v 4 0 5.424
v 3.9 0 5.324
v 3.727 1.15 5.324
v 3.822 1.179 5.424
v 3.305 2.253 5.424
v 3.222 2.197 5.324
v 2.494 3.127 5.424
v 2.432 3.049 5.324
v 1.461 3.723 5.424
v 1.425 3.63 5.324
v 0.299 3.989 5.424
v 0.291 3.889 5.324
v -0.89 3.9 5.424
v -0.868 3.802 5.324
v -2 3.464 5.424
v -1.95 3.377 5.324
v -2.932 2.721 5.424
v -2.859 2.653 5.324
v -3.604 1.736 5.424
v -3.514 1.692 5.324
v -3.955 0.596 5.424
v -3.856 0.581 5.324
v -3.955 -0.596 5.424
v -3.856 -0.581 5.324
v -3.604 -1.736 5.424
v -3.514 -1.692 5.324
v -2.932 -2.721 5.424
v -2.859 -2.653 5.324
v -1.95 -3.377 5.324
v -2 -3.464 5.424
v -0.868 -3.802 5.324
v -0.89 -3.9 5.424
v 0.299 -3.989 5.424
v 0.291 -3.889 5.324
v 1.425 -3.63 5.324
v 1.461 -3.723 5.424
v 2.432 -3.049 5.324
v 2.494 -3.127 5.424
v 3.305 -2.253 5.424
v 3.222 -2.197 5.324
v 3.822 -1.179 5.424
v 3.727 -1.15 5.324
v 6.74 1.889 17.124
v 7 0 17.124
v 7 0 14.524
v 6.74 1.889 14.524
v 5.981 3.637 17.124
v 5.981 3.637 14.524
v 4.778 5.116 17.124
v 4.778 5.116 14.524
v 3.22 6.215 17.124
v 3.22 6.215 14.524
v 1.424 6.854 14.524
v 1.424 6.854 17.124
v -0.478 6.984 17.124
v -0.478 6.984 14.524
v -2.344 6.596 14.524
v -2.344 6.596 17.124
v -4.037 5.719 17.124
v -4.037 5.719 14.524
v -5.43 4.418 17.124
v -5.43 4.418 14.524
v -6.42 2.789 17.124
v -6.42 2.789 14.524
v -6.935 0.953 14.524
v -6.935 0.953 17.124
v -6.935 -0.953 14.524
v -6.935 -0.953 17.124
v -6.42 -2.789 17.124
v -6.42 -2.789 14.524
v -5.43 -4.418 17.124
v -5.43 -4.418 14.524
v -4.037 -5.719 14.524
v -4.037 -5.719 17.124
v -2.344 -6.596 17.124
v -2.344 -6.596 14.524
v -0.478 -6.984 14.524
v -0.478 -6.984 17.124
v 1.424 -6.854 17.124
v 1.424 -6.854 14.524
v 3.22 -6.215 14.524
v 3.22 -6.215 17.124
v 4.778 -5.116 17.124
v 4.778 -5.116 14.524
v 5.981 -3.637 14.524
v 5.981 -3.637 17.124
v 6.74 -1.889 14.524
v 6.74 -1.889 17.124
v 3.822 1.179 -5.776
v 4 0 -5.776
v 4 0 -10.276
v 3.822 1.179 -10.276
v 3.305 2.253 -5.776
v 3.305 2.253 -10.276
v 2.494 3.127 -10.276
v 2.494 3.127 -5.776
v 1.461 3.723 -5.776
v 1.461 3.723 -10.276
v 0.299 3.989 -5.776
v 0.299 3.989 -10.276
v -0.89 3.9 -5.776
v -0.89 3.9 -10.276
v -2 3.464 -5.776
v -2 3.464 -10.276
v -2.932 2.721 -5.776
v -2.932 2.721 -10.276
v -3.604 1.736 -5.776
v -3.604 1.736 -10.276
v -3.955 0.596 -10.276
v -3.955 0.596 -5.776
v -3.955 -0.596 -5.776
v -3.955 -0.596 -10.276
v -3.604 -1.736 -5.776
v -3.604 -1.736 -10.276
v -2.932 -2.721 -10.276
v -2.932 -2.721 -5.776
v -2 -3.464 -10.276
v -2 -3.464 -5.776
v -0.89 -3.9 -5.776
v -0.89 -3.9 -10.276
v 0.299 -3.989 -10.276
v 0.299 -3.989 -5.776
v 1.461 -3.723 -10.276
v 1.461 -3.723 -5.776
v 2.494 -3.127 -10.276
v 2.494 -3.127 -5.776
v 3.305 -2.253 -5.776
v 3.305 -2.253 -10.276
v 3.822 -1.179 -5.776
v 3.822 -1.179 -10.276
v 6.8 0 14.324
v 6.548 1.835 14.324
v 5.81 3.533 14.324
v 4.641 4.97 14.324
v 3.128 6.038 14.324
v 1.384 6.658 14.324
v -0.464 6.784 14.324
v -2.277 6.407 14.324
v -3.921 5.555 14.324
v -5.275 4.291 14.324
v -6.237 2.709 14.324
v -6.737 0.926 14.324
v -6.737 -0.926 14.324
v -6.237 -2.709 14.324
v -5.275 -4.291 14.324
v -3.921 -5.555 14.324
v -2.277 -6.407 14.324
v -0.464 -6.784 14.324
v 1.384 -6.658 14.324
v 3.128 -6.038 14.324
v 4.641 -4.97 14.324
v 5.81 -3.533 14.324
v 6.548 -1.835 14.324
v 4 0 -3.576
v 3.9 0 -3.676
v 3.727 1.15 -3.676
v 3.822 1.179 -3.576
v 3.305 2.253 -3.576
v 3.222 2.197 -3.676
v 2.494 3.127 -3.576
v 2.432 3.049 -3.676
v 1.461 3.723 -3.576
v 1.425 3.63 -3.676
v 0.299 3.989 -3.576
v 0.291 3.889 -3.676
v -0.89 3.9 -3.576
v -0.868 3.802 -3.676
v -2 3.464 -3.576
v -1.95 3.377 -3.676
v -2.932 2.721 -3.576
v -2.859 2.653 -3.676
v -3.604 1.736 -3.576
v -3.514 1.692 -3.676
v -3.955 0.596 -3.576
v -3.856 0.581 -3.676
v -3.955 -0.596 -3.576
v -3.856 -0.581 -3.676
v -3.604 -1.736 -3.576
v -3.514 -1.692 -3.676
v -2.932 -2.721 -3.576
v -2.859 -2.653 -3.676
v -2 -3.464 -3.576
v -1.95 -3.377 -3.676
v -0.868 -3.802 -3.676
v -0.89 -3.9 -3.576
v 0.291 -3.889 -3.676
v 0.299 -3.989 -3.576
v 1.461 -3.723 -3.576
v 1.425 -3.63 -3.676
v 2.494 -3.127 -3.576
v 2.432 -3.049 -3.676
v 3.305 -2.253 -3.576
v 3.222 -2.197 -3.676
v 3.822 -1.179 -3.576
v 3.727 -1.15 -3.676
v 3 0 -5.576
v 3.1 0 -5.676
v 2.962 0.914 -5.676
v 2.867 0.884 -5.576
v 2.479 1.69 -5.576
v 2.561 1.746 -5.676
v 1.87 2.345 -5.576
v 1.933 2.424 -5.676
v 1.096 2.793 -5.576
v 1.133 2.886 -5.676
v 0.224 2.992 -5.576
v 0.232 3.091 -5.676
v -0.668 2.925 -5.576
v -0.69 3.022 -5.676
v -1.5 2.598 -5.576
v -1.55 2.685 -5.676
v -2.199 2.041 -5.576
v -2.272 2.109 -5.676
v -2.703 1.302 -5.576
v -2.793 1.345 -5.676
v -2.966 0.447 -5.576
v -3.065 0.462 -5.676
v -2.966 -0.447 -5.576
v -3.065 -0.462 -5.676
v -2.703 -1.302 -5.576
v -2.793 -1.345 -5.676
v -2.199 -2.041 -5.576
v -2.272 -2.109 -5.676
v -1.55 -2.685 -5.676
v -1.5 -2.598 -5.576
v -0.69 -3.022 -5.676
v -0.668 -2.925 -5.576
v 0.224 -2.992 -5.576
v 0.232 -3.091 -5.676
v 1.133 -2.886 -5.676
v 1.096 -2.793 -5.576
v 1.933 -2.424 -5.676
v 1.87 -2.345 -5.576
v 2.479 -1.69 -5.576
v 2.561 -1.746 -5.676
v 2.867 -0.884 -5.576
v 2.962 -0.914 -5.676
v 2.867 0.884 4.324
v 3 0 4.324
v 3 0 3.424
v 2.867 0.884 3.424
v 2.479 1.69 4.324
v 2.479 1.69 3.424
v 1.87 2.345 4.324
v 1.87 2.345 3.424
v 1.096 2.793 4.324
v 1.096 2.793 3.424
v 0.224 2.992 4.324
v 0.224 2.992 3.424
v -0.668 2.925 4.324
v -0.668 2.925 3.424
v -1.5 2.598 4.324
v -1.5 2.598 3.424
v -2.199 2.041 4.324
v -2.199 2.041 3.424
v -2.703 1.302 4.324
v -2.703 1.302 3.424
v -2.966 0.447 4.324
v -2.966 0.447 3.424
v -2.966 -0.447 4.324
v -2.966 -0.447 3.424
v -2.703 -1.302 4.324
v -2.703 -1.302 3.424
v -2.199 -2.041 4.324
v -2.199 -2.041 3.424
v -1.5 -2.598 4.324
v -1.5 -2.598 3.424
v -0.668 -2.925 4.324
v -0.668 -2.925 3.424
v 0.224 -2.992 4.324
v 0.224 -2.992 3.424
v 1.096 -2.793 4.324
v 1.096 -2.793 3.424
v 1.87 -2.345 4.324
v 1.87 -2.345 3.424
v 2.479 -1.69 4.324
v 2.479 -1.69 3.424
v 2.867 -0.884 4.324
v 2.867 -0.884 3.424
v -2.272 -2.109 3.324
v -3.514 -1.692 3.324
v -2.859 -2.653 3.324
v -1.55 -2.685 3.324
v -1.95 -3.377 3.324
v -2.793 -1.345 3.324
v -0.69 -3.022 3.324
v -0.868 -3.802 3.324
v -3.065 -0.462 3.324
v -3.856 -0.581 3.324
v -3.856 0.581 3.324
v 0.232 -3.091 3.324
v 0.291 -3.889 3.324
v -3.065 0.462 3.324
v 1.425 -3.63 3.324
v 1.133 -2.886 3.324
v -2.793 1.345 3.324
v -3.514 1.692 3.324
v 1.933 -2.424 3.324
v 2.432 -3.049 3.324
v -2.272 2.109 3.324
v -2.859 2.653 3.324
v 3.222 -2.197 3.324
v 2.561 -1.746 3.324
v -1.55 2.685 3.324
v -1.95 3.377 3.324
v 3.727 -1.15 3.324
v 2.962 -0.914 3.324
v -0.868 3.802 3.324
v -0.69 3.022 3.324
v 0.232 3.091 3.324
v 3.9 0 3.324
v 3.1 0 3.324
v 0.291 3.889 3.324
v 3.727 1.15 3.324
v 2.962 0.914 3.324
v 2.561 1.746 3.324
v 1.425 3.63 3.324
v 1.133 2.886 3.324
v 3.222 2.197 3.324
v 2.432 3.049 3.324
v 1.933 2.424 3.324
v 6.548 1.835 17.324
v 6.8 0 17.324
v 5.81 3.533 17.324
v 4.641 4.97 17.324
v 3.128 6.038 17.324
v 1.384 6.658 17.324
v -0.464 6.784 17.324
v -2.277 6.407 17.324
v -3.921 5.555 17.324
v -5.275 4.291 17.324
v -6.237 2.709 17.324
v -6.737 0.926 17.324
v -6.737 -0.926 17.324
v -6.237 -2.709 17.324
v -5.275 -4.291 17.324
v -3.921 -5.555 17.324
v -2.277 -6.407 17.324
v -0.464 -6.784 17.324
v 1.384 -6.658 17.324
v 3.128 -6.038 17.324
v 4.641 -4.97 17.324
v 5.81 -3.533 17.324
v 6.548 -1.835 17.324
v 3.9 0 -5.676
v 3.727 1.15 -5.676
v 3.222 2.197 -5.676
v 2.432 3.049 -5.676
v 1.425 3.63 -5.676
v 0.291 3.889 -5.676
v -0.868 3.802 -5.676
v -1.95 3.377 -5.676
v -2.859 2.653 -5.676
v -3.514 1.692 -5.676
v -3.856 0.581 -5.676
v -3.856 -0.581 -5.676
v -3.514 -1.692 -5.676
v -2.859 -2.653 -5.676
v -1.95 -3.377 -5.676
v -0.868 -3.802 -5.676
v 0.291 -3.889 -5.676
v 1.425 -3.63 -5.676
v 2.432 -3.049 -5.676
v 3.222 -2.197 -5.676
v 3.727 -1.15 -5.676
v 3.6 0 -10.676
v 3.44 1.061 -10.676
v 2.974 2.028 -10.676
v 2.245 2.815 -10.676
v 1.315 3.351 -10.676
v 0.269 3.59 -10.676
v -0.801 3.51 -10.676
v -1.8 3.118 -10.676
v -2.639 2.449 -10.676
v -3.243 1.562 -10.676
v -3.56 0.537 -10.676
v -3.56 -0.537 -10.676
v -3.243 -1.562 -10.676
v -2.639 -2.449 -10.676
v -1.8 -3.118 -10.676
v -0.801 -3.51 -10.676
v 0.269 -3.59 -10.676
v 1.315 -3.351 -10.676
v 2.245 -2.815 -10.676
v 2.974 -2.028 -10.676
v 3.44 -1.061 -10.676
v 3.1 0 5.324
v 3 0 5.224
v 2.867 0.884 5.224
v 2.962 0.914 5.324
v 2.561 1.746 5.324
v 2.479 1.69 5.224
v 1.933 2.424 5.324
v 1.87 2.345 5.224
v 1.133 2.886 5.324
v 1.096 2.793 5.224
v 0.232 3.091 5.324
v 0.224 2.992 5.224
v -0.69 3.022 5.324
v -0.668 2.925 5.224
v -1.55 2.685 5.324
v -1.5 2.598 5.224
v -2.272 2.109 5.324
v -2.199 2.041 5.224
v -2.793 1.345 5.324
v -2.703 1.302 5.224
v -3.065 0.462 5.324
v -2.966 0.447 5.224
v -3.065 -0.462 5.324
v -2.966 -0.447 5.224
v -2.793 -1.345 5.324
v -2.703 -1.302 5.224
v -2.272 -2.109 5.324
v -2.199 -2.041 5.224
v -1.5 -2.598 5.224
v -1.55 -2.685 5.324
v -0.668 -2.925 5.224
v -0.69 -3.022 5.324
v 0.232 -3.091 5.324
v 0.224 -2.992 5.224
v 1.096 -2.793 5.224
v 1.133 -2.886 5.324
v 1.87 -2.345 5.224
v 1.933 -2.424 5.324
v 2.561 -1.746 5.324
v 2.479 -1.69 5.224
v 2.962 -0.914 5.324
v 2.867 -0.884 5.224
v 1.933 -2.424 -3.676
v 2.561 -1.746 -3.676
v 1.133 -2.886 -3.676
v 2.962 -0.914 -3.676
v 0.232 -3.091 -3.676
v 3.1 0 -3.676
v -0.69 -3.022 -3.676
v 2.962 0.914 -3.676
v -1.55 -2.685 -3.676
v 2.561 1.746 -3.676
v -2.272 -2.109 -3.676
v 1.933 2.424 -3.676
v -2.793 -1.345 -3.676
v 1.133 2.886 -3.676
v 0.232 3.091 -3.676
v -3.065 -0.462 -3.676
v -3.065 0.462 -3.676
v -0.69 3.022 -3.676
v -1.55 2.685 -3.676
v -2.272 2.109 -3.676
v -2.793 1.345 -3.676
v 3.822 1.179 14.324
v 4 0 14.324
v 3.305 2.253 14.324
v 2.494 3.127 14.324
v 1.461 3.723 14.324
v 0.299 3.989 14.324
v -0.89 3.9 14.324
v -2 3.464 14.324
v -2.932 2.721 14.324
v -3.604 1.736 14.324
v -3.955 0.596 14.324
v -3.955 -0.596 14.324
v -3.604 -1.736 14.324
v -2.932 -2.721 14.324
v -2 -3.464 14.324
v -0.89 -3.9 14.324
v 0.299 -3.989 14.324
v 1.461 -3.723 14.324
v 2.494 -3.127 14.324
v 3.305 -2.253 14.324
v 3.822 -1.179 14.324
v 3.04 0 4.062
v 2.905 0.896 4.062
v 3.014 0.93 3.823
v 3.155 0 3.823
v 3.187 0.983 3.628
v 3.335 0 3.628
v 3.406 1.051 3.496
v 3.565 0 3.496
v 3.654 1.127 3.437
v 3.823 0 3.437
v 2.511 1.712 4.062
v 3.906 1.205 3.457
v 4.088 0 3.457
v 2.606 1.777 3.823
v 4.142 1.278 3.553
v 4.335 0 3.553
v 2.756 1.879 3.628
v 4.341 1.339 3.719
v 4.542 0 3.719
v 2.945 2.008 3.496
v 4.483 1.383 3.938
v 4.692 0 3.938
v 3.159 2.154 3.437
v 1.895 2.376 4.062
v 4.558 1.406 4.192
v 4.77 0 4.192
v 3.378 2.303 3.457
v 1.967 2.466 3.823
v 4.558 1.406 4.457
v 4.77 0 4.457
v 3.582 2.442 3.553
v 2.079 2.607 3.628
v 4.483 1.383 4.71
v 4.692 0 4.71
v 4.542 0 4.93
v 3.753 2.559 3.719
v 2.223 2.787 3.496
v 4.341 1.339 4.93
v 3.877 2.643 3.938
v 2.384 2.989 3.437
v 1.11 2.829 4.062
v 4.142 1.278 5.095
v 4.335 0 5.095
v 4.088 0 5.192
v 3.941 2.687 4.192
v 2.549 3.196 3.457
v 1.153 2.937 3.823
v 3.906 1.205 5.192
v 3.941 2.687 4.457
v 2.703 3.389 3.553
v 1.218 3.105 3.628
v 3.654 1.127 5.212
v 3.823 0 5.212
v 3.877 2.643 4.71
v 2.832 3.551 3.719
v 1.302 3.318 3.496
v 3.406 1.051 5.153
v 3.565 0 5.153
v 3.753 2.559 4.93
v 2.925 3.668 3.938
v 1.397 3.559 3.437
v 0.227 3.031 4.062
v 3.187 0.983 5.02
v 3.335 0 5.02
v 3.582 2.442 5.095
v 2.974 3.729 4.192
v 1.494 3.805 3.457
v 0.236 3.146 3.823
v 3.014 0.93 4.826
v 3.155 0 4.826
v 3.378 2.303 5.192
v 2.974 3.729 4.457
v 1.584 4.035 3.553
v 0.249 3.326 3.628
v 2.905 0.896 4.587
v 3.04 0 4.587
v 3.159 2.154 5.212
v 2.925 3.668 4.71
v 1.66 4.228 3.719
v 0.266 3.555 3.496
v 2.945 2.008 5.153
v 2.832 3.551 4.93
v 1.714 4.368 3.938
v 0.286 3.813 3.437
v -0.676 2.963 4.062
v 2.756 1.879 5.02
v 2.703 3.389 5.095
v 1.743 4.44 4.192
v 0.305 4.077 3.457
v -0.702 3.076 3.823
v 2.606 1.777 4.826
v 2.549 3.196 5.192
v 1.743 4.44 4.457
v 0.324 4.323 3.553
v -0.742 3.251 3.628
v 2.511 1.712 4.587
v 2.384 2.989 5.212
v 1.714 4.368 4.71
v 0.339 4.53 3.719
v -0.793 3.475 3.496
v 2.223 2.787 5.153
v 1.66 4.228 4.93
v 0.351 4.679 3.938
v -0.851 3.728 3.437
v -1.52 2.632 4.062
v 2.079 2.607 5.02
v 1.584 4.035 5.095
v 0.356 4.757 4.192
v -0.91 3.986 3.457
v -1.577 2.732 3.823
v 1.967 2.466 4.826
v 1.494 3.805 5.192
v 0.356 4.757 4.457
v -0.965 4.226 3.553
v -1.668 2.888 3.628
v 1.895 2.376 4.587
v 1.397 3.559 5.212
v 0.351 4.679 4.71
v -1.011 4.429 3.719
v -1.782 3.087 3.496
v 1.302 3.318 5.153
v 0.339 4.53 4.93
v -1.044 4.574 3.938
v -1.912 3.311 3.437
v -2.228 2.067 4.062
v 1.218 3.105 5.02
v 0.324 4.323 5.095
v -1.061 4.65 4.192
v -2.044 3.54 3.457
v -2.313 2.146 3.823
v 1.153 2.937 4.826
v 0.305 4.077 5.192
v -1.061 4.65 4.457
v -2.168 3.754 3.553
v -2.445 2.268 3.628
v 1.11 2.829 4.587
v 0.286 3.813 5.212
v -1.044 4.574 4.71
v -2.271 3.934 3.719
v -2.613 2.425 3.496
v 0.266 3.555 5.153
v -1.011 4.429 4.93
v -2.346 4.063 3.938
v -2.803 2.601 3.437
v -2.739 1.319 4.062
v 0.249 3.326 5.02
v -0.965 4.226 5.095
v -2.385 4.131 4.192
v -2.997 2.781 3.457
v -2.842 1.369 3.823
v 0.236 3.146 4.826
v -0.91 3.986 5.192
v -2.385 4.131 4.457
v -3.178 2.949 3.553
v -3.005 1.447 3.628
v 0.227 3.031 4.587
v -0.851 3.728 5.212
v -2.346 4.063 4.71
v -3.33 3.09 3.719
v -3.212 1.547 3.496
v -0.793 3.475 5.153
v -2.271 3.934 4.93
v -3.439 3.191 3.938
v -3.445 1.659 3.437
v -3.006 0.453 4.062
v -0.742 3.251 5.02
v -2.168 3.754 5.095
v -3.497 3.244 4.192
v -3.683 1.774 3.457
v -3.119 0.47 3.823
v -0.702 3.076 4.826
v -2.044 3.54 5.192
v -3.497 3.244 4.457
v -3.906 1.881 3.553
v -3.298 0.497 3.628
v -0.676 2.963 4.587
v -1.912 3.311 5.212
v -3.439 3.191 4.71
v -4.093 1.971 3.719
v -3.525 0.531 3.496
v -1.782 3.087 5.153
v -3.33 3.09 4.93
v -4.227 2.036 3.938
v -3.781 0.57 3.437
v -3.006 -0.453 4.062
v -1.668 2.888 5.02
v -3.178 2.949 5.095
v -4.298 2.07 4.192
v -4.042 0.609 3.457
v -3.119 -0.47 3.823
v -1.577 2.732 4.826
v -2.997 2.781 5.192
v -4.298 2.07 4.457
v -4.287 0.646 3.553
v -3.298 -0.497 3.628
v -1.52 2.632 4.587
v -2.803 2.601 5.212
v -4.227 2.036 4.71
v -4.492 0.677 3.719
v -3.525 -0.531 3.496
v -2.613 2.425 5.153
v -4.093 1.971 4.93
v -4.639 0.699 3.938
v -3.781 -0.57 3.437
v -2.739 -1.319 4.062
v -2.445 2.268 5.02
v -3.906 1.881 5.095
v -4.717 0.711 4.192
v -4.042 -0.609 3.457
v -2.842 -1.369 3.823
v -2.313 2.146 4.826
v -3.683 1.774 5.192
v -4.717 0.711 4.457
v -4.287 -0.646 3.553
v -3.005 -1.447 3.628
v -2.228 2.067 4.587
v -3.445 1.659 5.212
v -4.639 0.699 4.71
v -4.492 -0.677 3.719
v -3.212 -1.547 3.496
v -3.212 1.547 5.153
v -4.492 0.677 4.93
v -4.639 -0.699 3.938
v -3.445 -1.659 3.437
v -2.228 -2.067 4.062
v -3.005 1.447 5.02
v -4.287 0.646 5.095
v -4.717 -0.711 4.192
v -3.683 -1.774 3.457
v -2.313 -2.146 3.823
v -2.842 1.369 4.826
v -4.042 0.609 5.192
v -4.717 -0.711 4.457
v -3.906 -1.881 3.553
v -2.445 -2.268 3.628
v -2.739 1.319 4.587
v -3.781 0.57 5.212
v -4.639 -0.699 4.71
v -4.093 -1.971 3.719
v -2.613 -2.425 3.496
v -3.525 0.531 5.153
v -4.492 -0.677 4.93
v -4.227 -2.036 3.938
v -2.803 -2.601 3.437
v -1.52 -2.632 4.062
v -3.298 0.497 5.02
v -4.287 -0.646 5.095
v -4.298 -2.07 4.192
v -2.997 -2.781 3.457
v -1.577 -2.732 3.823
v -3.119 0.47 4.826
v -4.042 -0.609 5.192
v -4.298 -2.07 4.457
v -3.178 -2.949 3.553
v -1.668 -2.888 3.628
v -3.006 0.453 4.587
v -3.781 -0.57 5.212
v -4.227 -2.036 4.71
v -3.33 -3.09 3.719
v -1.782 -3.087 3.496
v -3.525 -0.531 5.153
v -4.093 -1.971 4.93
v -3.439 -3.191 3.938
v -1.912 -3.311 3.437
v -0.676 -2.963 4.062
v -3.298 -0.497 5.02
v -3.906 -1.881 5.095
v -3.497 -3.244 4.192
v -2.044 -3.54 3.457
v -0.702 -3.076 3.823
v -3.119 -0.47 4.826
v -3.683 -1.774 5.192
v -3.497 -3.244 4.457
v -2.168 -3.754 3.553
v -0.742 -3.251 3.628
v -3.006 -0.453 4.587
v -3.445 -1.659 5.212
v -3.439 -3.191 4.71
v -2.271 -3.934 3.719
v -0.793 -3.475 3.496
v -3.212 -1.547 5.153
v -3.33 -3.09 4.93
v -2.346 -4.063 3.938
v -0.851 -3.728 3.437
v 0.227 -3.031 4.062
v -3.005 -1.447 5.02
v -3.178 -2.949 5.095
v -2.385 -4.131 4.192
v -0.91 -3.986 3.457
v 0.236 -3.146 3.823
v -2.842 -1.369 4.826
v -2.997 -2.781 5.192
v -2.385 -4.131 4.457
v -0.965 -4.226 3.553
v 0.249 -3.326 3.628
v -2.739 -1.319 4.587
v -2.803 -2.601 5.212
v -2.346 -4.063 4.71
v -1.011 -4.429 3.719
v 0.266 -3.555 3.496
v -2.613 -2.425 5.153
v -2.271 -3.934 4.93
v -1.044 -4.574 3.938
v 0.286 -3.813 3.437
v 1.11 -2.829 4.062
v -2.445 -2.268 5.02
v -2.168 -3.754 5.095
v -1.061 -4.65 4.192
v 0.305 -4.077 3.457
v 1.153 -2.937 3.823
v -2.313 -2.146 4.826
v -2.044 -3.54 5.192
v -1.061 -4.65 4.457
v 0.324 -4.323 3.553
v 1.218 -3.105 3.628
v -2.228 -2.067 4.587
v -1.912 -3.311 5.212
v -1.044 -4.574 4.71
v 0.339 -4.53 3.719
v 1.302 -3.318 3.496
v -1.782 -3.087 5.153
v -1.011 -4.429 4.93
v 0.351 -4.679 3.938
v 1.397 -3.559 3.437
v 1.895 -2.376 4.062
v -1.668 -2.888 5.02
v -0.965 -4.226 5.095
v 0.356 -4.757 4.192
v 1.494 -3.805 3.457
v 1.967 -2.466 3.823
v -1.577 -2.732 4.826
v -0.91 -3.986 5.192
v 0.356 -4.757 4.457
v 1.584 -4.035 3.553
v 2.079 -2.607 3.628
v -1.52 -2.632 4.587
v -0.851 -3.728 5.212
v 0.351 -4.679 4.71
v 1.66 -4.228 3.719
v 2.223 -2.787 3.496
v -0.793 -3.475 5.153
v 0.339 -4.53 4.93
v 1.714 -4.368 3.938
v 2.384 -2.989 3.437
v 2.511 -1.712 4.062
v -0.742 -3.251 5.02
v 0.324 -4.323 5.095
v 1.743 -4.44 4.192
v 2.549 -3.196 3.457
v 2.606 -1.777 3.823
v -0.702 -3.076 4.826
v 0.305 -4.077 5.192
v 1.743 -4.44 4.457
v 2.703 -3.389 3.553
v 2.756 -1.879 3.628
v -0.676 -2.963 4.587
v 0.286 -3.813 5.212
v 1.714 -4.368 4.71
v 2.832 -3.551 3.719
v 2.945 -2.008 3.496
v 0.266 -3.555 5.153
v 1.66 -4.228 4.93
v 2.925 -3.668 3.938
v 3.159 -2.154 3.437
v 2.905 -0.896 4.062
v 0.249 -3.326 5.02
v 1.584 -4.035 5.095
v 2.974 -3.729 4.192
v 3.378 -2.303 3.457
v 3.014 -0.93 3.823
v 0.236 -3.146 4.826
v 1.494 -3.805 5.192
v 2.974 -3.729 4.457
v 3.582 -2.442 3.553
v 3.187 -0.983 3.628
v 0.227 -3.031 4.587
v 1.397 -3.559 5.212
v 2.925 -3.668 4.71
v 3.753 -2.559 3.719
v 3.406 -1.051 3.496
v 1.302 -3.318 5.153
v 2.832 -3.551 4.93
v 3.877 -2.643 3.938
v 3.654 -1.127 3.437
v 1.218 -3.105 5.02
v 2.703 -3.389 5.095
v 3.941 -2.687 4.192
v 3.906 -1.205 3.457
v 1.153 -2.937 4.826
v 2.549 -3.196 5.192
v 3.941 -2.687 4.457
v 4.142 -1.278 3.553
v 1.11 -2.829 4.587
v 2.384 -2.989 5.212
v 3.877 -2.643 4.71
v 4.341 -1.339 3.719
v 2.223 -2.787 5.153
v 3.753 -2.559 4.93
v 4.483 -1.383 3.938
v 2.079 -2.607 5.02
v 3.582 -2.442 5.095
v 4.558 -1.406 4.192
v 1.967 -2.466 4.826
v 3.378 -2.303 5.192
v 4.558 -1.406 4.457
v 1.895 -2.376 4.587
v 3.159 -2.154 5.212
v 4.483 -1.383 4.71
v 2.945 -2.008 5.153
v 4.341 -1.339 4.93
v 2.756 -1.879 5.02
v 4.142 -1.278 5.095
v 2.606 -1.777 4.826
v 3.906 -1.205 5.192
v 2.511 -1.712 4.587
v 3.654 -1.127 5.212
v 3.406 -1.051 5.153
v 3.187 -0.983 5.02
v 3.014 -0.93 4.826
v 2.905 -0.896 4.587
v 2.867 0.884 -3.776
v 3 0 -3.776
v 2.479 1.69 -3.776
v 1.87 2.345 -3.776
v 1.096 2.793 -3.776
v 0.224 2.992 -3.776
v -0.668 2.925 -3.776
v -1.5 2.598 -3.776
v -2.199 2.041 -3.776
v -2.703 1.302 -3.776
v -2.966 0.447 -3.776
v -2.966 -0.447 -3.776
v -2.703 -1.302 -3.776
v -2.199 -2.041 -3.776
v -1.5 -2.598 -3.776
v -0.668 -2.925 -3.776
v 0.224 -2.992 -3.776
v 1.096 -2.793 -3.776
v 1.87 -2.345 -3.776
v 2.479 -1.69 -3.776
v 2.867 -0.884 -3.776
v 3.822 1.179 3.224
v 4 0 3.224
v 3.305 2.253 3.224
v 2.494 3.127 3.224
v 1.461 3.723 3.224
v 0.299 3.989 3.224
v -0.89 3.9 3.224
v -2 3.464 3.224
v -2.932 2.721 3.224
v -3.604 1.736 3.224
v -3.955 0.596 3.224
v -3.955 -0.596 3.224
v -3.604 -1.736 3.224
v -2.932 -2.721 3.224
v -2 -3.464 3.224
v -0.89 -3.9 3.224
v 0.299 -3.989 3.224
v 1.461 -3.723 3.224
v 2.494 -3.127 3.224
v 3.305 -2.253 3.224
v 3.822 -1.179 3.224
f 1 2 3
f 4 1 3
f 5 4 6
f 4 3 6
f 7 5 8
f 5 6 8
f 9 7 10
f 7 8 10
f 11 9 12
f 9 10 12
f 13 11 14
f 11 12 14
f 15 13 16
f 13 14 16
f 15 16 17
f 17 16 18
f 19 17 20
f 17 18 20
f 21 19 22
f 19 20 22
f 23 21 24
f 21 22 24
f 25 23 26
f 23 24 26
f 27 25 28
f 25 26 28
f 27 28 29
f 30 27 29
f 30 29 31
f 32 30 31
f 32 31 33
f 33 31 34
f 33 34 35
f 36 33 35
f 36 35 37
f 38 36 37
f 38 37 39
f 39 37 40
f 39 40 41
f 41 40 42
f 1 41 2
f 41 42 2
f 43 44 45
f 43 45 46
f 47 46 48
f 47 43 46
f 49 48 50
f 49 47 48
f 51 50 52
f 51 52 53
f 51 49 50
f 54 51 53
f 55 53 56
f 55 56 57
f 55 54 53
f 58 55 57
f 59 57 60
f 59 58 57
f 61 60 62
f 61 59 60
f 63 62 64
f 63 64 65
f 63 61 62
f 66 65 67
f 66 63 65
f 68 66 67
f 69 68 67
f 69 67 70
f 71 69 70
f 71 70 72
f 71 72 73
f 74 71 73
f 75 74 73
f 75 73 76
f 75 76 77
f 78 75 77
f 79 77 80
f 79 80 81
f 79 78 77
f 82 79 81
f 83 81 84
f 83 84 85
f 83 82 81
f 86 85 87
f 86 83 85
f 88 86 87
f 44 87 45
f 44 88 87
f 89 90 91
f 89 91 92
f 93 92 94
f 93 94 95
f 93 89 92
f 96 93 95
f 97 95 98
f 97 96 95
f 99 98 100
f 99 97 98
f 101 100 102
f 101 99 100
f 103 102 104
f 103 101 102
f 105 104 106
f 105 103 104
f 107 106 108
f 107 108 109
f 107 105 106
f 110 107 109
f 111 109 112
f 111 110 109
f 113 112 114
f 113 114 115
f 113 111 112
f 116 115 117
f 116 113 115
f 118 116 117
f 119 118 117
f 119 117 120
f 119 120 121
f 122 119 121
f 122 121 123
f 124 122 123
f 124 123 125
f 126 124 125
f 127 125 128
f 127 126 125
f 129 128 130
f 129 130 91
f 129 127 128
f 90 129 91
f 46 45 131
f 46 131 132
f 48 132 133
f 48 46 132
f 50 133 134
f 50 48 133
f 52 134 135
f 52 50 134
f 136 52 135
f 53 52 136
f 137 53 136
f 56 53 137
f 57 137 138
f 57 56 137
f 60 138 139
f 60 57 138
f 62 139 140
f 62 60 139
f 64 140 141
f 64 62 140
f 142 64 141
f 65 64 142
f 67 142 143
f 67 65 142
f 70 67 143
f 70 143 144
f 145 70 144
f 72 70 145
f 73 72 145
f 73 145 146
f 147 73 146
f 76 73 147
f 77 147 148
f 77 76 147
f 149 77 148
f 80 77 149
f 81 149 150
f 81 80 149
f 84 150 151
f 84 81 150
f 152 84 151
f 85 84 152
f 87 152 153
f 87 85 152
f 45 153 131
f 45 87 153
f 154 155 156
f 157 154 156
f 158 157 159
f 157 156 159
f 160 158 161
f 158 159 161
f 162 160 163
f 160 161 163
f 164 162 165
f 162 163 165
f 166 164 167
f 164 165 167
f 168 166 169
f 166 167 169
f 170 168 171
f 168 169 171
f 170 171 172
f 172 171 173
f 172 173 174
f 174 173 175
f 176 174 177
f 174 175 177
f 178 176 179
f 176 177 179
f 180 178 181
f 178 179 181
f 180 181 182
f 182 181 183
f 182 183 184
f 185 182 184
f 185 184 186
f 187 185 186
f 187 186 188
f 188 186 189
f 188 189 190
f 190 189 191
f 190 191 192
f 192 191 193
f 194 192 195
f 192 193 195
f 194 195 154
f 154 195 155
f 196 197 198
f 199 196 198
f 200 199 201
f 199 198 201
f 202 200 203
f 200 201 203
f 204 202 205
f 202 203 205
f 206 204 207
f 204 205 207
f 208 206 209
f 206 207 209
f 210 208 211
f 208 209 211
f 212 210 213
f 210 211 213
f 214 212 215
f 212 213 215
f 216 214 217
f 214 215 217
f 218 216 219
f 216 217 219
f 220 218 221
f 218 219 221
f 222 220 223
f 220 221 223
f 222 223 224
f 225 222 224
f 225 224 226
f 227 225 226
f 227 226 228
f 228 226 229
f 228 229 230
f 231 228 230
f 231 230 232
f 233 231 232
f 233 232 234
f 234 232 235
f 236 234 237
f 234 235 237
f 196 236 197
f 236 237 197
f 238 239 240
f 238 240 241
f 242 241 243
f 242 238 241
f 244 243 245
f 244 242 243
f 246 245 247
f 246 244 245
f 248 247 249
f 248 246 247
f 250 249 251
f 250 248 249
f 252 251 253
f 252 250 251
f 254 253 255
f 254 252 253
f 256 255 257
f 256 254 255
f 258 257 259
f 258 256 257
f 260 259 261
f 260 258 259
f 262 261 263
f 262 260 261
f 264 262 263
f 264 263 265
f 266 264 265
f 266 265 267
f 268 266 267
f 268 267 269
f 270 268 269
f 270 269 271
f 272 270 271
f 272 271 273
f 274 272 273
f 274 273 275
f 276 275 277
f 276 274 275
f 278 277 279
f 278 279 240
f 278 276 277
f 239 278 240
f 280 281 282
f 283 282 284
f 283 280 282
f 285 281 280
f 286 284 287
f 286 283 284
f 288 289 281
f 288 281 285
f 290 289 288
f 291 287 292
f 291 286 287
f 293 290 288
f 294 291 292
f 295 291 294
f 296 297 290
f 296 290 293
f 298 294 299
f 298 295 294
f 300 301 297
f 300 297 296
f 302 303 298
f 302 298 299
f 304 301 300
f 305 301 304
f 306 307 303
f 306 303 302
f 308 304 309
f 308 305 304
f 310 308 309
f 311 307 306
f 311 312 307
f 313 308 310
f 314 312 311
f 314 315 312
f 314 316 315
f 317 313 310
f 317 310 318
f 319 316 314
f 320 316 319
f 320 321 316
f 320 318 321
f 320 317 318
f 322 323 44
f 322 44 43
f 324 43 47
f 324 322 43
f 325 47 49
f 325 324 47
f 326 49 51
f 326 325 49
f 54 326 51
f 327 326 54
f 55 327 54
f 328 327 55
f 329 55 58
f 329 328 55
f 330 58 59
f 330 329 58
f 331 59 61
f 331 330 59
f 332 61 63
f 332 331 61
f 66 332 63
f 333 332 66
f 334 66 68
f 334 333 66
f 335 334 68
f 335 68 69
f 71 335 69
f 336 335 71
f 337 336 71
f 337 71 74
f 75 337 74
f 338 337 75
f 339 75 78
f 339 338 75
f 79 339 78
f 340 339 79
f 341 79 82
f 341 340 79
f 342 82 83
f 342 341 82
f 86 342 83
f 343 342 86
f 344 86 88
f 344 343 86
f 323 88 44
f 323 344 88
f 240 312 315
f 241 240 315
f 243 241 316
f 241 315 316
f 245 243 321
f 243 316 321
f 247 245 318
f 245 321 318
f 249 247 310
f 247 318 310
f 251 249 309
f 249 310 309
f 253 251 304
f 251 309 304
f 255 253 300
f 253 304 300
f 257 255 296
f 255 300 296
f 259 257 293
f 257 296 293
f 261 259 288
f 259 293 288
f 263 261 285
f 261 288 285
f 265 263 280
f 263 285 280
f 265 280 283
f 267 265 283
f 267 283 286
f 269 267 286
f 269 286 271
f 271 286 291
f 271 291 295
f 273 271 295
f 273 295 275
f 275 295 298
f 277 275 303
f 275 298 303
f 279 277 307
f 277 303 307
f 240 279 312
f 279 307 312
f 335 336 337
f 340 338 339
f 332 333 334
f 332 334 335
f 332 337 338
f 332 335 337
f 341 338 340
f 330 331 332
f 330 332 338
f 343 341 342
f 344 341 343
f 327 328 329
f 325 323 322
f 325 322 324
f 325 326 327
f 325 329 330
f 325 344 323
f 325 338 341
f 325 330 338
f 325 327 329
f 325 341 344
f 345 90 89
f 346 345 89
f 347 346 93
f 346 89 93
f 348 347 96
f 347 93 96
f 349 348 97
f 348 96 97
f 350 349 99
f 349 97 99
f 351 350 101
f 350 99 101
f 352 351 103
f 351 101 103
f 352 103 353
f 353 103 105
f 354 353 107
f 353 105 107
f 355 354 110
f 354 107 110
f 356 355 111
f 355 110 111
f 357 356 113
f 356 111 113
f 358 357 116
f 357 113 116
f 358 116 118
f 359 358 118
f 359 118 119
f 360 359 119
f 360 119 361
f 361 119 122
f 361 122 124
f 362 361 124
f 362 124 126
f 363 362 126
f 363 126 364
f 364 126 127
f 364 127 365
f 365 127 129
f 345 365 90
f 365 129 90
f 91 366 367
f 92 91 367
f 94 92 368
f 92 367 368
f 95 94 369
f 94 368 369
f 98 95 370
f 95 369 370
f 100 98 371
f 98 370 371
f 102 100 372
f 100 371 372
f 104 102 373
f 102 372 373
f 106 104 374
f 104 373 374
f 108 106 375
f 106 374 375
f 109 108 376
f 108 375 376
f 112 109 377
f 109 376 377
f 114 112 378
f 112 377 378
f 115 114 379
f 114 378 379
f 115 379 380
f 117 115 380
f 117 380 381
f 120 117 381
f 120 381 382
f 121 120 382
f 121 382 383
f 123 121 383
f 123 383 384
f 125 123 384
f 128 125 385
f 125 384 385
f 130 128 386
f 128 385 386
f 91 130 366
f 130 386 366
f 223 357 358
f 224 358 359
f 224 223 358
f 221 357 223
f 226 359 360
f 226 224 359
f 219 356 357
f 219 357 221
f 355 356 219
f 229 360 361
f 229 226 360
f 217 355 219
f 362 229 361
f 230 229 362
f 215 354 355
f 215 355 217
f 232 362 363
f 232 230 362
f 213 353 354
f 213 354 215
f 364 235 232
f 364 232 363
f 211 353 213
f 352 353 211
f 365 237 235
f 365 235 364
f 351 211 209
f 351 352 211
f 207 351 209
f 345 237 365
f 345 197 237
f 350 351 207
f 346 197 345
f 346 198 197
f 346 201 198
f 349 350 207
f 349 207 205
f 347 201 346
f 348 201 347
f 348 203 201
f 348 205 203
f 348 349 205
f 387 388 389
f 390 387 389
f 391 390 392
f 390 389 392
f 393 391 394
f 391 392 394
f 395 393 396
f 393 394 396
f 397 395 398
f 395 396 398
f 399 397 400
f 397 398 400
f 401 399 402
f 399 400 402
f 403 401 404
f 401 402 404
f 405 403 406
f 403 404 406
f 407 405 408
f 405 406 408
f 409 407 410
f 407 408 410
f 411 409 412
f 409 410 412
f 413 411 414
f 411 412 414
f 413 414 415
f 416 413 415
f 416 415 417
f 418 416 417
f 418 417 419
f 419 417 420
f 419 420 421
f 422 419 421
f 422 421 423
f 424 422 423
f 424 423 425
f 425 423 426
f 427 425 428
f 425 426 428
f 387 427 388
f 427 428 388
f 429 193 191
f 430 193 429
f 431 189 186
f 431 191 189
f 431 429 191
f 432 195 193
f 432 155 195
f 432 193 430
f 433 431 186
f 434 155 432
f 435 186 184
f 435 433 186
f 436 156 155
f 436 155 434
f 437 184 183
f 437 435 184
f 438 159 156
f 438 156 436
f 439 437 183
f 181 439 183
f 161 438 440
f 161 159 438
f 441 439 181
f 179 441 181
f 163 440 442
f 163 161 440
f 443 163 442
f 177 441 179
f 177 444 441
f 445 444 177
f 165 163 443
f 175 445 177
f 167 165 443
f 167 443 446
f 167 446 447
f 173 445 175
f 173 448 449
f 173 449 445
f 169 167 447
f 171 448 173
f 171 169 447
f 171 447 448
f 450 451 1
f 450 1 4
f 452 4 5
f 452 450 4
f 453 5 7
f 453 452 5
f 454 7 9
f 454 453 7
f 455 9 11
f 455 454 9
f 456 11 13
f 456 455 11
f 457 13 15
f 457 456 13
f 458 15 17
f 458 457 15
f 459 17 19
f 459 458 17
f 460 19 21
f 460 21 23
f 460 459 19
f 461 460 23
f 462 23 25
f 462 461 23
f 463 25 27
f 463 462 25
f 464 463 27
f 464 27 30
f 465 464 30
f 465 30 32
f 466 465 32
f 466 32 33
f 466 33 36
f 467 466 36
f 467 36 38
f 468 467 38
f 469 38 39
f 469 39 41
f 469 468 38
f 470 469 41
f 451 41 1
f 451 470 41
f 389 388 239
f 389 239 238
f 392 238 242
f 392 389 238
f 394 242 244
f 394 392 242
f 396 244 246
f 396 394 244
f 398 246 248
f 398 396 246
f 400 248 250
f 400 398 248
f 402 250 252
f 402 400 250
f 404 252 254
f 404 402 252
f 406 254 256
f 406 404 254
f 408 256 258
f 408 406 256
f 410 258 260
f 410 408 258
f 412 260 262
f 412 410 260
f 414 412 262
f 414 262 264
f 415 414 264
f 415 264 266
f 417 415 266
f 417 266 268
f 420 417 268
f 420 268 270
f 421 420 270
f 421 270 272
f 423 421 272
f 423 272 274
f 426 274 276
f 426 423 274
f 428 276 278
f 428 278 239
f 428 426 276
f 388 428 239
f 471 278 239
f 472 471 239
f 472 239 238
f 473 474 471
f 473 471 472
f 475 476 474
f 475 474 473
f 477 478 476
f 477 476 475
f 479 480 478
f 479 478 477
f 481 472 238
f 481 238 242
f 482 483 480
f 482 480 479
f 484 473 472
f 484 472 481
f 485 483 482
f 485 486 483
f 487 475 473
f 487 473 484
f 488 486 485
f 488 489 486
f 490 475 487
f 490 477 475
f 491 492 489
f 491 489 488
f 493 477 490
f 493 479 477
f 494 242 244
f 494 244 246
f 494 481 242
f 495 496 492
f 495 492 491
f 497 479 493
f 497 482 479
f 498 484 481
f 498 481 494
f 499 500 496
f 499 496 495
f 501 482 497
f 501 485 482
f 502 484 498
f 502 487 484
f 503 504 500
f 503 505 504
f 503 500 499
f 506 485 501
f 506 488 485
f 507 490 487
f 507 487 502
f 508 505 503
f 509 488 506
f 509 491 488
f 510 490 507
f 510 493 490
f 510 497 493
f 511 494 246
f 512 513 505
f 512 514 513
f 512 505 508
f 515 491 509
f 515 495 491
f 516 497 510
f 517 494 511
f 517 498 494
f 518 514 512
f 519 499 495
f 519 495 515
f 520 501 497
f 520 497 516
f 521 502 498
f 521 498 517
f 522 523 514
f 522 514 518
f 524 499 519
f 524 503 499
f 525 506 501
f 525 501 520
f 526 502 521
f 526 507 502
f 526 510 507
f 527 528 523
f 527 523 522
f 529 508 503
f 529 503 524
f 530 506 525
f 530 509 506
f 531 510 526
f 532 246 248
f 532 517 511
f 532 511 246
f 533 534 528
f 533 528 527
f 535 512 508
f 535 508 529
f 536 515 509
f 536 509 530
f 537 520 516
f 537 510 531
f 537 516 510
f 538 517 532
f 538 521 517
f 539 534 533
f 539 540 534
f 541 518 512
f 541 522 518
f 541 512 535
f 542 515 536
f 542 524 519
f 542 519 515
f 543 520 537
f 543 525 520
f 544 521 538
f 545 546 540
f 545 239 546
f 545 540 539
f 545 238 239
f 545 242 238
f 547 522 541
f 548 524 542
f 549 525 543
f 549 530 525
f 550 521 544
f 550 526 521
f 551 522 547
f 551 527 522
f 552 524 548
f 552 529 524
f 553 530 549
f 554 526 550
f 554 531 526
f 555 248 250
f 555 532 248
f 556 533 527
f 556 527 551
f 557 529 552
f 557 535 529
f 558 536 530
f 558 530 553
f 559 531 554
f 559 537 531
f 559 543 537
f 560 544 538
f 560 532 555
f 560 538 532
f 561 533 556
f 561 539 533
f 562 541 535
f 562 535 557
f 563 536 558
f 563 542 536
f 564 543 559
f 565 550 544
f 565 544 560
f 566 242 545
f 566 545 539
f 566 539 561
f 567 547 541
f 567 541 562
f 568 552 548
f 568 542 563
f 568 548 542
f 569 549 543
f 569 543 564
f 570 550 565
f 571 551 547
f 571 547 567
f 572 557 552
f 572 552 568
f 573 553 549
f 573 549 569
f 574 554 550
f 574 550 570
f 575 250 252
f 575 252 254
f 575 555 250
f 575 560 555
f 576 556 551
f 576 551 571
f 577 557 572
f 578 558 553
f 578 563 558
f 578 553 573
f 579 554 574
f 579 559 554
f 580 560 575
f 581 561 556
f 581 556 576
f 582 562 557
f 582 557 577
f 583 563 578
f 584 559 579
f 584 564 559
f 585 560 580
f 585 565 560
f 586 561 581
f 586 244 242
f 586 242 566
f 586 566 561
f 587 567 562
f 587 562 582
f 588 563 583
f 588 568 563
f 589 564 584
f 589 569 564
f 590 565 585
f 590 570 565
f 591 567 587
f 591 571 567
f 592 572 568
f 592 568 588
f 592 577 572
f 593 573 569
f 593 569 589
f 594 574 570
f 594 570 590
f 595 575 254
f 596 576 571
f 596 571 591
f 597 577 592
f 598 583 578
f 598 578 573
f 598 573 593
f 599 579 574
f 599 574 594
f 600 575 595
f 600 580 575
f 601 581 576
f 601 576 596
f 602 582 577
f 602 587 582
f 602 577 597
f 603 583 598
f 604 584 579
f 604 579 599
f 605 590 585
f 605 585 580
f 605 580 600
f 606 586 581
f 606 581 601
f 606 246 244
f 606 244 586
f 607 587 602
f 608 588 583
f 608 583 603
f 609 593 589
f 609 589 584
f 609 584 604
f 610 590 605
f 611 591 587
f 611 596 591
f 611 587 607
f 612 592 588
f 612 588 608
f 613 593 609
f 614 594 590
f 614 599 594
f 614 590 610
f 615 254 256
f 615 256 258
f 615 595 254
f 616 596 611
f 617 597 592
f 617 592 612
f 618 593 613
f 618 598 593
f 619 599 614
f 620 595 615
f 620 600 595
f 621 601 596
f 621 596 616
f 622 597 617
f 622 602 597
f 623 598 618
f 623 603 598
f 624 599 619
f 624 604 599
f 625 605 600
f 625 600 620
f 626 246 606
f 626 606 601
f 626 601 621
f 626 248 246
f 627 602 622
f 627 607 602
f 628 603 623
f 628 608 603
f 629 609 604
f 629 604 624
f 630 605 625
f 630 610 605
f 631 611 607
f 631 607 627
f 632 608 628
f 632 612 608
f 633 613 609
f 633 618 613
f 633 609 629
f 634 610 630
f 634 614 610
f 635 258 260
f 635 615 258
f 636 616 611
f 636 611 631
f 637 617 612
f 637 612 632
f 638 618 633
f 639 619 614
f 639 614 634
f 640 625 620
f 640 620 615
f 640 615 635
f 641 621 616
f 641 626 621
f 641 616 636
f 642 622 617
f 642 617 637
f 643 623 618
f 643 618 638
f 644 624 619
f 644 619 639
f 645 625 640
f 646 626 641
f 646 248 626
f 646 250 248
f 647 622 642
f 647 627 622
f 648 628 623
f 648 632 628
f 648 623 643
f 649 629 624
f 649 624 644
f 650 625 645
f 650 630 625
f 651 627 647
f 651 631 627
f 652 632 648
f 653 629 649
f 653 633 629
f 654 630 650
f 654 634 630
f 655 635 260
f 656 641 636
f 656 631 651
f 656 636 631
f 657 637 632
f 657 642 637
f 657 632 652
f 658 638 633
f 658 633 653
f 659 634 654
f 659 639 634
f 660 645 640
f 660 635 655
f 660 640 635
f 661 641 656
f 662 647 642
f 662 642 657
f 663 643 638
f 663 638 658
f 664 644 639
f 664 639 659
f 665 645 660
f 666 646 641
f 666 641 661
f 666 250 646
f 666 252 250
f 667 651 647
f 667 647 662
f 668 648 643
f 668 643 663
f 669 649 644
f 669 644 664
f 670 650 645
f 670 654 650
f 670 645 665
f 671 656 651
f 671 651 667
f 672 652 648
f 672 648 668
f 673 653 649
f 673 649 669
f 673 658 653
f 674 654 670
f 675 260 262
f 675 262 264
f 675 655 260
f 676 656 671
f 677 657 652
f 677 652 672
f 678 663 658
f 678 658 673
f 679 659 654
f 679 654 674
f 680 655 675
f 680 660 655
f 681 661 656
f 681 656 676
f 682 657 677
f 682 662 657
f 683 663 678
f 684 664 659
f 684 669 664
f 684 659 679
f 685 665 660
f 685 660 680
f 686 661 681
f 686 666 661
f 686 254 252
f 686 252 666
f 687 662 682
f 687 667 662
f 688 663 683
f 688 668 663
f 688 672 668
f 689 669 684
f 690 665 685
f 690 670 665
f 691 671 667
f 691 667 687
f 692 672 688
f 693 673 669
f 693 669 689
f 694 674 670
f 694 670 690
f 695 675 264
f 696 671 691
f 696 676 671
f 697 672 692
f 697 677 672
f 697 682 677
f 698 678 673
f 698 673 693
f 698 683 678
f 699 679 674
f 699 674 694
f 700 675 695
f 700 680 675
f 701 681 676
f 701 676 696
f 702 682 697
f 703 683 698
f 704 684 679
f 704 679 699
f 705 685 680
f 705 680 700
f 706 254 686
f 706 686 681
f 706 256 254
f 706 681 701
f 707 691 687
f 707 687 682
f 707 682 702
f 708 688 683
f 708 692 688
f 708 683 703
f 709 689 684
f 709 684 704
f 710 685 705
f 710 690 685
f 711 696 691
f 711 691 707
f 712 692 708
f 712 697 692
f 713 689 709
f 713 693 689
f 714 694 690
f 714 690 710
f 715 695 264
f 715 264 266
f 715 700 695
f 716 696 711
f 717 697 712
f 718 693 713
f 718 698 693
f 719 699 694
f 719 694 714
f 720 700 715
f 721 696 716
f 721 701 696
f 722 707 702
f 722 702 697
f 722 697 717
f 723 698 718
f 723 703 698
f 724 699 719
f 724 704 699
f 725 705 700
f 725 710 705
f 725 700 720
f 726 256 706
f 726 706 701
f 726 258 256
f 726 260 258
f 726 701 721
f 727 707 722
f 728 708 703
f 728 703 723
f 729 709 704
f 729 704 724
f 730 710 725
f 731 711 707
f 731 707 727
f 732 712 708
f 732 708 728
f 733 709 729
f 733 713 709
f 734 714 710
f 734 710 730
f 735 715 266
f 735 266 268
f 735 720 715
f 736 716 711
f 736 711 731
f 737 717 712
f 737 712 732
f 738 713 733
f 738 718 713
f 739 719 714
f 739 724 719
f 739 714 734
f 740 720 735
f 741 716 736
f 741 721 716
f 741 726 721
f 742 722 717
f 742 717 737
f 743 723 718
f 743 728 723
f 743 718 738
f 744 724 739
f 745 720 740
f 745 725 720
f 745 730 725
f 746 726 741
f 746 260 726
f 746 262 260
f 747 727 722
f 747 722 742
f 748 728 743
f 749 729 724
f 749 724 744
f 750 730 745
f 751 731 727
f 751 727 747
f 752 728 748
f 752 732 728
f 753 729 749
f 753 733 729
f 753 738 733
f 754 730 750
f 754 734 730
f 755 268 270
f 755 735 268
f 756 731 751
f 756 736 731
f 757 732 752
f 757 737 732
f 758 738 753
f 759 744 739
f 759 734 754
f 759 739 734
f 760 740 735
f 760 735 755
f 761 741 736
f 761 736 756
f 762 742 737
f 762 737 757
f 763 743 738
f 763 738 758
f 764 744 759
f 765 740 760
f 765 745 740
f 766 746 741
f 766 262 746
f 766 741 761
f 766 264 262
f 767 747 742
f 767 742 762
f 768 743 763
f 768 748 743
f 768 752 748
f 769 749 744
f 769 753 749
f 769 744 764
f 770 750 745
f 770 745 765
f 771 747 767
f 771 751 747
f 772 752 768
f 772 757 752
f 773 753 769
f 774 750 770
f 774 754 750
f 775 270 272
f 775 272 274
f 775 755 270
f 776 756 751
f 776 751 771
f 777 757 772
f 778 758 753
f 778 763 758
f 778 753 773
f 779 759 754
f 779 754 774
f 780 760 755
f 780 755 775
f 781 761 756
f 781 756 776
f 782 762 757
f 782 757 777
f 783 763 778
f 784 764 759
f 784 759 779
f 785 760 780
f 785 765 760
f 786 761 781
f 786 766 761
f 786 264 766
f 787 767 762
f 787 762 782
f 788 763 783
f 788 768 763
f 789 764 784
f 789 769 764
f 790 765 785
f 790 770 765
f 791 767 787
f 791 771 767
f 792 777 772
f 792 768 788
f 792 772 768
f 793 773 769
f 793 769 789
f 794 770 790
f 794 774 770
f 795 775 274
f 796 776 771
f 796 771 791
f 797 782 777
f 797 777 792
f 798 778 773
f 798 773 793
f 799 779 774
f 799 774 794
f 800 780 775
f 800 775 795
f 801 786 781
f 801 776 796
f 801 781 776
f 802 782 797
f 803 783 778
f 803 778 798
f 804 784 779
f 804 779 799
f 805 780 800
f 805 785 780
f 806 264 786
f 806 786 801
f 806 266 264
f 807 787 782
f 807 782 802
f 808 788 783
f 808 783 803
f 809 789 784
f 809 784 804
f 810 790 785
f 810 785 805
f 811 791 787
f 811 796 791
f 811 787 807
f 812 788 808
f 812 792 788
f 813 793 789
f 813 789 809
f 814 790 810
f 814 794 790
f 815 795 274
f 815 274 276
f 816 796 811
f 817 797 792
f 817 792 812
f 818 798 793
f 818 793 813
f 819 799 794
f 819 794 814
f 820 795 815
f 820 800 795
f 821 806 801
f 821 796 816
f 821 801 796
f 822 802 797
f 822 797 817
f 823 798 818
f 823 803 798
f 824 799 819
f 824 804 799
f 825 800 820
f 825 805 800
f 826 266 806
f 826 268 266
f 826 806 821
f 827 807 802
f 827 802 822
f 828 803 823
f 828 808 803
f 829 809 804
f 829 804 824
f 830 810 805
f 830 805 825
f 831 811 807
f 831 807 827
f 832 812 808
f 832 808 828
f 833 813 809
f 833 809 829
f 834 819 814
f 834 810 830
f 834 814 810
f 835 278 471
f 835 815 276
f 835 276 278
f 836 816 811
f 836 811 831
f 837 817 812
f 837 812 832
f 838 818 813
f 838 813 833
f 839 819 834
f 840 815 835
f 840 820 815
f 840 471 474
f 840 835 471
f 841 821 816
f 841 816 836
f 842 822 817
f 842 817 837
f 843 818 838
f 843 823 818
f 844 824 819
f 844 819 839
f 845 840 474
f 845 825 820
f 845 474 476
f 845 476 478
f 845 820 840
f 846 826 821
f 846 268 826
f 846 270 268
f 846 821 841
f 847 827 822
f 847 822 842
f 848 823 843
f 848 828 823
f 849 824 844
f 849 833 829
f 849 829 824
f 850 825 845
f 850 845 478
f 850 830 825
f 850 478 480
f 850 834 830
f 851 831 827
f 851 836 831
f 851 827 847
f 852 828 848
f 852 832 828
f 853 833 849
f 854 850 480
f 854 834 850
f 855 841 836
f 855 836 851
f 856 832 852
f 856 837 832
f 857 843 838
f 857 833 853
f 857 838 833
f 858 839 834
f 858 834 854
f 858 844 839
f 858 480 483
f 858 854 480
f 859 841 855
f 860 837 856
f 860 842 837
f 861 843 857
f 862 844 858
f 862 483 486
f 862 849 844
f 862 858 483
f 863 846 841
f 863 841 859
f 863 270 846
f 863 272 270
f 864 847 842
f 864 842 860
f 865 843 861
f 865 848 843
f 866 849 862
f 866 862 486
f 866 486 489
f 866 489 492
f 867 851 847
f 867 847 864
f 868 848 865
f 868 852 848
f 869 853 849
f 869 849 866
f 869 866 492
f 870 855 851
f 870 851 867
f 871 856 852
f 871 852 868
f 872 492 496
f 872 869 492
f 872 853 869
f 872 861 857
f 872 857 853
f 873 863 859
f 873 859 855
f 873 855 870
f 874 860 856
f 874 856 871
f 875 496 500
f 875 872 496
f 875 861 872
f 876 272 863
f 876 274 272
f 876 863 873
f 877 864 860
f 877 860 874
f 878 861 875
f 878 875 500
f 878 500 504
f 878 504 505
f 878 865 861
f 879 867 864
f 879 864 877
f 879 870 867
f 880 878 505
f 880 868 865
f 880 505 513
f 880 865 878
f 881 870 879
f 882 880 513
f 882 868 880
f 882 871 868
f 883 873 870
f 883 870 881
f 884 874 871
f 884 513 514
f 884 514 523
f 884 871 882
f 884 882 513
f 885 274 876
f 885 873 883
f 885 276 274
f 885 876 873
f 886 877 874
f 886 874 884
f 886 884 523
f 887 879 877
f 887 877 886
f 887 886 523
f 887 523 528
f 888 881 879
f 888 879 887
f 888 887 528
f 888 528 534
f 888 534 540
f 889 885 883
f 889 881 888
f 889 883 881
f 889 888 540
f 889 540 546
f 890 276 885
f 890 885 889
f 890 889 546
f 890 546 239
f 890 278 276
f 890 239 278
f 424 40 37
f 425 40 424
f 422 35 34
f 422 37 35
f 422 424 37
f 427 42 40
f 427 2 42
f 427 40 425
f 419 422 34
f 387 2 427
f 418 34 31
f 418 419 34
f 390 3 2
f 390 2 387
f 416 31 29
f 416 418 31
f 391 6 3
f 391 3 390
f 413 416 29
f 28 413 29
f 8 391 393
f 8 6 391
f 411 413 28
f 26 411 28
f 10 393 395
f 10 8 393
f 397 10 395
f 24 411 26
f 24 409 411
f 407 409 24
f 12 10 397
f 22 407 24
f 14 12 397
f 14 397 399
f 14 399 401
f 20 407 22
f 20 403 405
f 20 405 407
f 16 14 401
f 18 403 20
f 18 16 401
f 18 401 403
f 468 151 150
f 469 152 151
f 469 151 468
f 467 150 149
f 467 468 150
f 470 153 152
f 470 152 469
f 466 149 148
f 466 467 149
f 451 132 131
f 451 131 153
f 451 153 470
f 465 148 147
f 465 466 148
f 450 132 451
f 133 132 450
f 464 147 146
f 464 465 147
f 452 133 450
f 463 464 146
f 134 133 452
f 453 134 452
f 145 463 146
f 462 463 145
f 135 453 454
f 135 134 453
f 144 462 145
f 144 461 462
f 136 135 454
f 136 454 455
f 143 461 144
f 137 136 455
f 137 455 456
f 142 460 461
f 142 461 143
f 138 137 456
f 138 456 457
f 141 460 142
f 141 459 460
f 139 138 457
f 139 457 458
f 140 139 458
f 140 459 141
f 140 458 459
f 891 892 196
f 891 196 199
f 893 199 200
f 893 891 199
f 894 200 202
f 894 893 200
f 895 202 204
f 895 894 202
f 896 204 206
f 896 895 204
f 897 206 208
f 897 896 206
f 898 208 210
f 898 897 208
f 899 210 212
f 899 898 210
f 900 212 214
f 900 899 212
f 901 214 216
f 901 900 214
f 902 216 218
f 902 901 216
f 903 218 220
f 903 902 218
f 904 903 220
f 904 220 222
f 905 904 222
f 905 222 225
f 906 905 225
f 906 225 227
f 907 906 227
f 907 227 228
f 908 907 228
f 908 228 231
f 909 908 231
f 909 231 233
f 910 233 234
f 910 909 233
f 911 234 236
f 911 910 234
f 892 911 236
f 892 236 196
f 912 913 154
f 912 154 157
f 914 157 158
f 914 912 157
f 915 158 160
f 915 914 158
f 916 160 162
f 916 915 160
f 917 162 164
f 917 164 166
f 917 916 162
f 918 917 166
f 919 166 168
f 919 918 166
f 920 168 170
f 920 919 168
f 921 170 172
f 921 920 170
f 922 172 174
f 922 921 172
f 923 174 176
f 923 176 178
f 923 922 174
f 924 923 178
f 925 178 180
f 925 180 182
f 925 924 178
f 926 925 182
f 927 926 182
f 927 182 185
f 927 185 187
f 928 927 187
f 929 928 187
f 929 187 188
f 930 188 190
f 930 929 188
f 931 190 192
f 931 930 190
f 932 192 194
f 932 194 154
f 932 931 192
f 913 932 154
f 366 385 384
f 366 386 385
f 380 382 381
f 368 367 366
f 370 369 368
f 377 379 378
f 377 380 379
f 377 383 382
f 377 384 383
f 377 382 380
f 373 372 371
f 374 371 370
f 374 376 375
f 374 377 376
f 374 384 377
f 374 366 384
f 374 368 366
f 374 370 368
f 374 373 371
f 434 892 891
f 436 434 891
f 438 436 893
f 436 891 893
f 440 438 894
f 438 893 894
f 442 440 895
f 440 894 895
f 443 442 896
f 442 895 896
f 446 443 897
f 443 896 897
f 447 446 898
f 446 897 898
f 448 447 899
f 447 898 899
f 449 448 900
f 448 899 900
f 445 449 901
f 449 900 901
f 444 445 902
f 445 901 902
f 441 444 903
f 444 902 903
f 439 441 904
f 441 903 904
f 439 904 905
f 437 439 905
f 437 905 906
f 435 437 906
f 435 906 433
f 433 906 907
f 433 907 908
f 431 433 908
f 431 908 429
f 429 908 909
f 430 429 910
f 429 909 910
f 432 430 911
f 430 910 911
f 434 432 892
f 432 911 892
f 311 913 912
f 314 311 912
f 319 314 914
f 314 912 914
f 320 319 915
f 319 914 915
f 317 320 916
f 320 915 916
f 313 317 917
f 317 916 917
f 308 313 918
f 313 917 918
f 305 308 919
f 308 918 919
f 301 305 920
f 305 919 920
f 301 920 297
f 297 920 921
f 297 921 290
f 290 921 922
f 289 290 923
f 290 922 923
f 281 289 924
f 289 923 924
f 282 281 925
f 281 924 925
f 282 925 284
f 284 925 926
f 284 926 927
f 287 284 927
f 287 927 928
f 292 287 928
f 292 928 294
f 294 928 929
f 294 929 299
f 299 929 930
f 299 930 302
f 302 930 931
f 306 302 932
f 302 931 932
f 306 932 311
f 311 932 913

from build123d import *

# Parameters (mm, degrees)
F2_SIZE = 0.1
F3_SIZE = 0.1
F4_SIZE = 0.2
F5_SIZE = 0.4


with BuildPart() as f1:
    # F0 (on Front) → F1 (revolve)
    with BuildSketch(Plane.XZ):
        with BuildLine():
            ThreePointArc((4.78, 4.324201), (3.89, 5.214201), (3, 4.324201))
            ThreePointArc((3, 4.324201), (3.89, 3.434201), (4.78, 4.324201))
        make_face()
        Polygon((7, 17.324201), (0, 17.324201), (0, -10.675799), (4, -10.675799), (4, -5.675799), (3, -5.675799), (3, -3.675799), (4, -3.675799), (4, 3.324201), (3, 3.324201), (3, 4.324201), (3, 5.324201), (4, 5.324201), (4, 14.324201), (7, 14.324201), align=None)
    revolve(axis=Axis((0, 0, 3.324201), (0, 0, 1)))

    # F2
    f2_edges = [f1.edges().sort_by_distance(p)[0] for p in [
        (-3, 0, 5.324201),
        (-4, 0, 5.324201),
    ]]
    chamfer(f2_edges, length=F2_SIZE)

    # F3
    f3_edges = [f1.edges().sort_by_distance(p)[0] for p in [
        (-4, 0, 3.324201),
        (-4, 0, -3.675799),
        (-4, 0, -5.675799),
        (-3, 0, 3.324201),
        (-3, 0, -5.675799),
        (-3, 0, -3.675799),
    ]]
    chamfer(f3_edges, length=F3_SIZE)

    # F4
    f4_edges = [f1.edges().sort_by_distance(p)[0] for p in [
        (-7, 0, 17.324201),
        (-7, 0, 14.324201),
    ]]
    chamfer(f4_edges, length=F4_SIZE)

    # F5
    f5_edges = [f1.edges().sort_by_distance(p)[0] for p in [
        (-4, 0, -10.675799),
    ]]
    chamfer(f5_edges, length=F5_SIZE)


solid = f1.part
